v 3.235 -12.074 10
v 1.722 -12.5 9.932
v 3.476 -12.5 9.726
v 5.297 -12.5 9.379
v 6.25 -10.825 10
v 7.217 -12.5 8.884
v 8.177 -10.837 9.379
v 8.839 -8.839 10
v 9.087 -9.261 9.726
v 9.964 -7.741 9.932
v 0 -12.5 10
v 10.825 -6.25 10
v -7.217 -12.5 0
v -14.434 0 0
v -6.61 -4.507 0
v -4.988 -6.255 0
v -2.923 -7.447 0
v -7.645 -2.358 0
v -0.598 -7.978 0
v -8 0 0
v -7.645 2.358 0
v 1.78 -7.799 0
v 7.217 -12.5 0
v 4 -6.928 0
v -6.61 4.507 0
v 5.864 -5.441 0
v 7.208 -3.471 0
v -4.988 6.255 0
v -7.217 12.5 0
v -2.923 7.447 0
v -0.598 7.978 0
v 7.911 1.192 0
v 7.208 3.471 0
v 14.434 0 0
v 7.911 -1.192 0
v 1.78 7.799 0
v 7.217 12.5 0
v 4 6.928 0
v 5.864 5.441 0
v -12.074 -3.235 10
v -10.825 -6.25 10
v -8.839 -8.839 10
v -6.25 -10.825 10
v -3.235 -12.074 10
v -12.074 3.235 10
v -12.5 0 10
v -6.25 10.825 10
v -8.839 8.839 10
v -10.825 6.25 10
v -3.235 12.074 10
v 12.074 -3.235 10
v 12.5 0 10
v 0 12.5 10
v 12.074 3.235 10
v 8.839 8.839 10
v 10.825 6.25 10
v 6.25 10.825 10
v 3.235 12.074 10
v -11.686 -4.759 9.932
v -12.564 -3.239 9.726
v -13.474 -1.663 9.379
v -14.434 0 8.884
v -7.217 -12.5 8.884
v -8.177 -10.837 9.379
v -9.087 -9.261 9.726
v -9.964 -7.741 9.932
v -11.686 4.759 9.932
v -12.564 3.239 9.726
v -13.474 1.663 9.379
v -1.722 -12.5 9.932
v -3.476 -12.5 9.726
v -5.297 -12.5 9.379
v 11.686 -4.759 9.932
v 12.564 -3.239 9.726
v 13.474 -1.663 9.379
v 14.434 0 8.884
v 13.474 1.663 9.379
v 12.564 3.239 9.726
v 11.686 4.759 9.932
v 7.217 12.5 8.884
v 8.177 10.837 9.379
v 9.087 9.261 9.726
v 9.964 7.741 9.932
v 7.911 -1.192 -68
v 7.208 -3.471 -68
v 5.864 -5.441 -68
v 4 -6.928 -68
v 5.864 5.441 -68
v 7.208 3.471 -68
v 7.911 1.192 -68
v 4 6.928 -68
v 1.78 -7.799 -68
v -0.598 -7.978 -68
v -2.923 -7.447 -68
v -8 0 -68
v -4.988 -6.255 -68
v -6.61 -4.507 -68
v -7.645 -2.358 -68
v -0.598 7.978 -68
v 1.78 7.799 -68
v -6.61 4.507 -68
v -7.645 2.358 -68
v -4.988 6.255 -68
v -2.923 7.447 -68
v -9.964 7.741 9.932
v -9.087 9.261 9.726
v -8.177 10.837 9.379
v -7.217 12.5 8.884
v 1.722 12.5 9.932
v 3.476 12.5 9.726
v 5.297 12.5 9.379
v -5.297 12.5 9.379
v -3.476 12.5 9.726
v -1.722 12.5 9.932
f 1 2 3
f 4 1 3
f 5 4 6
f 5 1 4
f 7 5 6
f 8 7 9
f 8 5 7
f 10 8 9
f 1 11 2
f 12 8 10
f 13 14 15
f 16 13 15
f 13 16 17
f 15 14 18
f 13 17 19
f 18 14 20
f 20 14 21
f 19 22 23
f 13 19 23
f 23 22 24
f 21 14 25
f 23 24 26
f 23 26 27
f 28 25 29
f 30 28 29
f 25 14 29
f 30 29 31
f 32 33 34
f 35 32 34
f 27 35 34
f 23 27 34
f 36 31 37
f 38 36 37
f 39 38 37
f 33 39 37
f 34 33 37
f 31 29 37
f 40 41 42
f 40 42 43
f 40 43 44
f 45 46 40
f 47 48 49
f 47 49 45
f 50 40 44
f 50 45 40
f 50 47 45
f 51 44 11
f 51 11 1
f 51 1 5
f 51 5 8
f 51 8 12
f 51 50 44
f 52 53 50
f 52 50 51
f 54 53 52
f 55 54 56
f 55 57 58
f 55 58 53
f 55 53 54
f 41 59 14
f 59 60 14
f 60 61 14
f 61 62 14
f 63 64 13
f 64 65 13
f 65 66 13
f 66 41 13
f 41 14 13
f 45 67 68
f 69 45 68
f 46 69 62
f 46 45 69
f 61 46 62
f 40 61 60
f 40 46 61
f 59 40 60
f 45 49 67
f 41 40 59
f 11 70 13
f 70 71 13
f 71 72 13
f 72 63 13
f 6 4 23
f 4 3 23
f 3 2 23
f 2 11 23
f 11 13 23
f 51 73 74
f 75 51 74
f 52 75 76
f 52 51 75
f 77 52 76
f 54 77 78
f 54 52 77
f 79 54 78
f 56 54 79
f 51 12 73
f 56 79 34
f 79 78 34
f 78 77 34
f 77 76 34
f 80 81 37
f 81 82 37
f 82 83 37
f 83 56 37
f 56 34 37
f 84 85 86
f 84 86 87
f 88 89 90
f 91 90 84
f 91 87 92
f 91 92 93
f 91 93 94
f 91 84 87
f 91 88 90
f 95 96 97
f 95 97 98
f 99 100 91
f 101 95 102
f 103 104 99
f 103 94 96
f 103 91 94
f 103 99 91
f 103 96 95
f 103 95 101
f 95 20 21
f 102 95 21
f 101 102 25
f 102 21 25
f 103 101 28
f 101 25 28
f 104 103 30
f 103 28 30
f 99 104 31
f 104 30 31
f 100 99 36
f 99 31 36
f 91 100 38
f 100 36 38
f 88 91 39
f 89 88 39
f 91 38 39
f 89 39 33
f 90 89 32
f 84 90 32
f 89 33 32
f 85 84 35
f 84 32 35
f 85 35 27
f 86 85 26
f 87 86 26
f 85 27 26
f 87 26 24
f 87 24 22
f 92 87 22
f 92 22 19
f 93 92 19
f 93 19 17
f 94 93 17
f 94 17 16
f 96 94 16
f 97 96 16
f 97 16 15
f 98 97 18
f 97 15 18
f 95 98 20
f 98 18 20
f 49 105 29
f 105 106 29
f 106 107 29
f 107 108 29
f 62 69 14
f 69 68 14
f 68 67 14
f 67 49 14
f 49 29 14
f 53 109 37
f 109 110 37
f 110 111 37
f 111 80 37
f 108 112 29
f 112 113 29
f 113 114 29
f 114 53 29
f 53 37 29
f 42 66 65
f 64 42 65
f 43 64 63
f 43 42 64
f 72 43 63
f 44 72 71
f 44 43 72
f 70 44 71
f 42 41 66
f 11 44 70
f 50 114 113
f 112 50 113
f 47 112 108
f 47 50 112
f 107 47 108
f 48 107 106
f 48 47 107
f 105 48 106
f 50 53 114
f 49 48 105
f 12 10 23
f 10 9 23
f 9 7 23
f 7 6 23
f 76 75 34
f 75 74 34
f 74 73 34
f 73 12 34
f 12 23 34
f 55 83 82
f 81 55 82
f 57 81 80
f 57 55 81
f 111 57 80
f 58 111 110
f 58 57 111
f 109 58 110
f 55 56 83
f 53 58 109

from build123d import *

# Parameters (mm, degrees)
Y_KSEKLIK_EKSTR_ZYON1_DEPTH = 10
IZIM2_R                     = 8
Y_KSEKLIK_EKSTR_ZYON2_DEPTH = 68
IZIM3_OUTSIDE_W             = 82.878
IZIM3_OUTSIDE_H             = 79.01
IZIM3_OUTSIDE_R             = 12.5
KES_EKSTR_ZYON2_DEPTH       = 10
KES_EKSTR_ZYON2_DRAFT       = -60


with BuildPart() as part:
    # Çizim1 → Yükseklik-Ekstrüzyon1 (new body)
    with BuildSketch(Plane.XY):
        Polygon((14.43375673, 0), (7.216878365, 12.5), (-7.216878365, 12.5), (-14.43375673, 0), (-7.216878365, -12.5), (7.216878365, -12.5), align=None)
    extrude(amount=Y_KSEKLIK_EKSTR_ZYON1_DEPTH)

    # Çizim2 → Yükseklik-Ekstrüzyon2 (add)
    with BuildSketch(Plane(origin=(0, 0, 0), x_dir=(-1, 0, 0), z_dir=(0, 0, -1))):
        Circle(IZIM2_R)
    extrude(amount=Y_KSEKLIK_EKSTR_ZYON2_DEPTH)


with BuildPart() as kes_ekstr_zyon2_tool:
    # Çizim3 outside → Kes-Ekstrüzyon2 (with draft: the straight prism first)
    with BuildSketch(Plane.XY.offset(10)):
        Rectangle(IZIM3_OUTSIDE_W, IZIM3_OUTSIDE_H)
        Circle(IZIM3_OUTSIDE_R, mode=Mode.SUBTRACT)
    extrude(amount=-KES_EKSTR_ZYON2_DEPTH)
    # Kes-Ekstrüzyon2: the draft: its side faces are tilted about the plane it starts from
    kes_ekstr_zyon2_sides = [kes_ekstr_zyon2_tool.faces().sort_by_distance(p)[0] for p in [
        (0, -39.505, 5),
        (41.439, 0, 5),
        (0, 39.505, 5),
        (-41.439, 0, 5),
        (-12.5, 0, 5),
    ]]
    draft(kes_ekstr_zyon2_sides, Plane.XY.offset(10), KES_EKSTR_ZYON2_DRAFT)


with BuildPart() as part_1:
    add(part.part)

    # Kes-Ekstrüzyon2: cut by kes_ekstr_zyon2_tool
    add(kes_ekstr_zyon2_tool.part, mode=Mode.SUBTRACT)


solid = part_1.part
